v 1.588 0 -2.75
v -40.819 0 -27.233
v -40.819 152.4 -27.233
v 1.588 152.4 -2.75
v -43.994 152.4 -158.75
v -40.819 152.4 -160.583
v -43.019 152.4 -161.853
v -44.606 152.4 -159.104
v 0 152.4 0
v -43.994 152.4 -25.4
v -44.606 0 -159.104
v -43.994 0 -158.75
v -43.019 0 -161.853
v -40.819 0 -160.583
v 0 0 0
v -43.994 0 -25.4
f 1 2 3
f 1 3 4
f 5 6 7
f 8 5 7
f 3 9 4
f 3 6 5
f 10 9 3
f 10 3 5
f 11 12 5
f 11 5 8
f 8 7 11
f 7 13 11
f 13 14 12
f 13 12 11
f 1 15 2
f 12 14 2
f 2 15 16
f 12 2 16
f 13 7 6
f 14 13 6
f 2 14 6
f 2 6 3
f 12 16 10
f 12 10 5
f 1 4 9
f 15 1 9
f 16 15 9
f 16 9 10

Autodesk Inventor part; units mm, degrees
ref_plane "YZ Plane" through (0, 0, 0) normal (1, 0, 0) x (0, 1, 0)
ref_plane "XZ Plane" through (0, 0, 0) normal (0, 1, 0) x (-1, 0, 0)
ref_plane "XY Plane" through (0, 0, 0) normal (0, 0, 1) x (1, 0, 0)
sketch "Sketch6" plane through (0, 0, 0) normal (0, 1, 0) x (-1, 0, 0)
  line L0 (0, 0) -> (43.9941, -25.4)
  line L1 (43.9941, -25.4) -> (43.9941, -158.75)
  line L2 (43.9941, -158.75) -> (44.6063, -159.1035)
  line L3 (43.9941, -158.75) -> (44.701, -158.75) construction
  line L4 (43.0188, -161.8531) -> (40.8191, -160.5831)
  line L5 (40.8191, -160.5831) -> (40.8191, -27.2331)
  line L6 (40.8191, -27.2331) -> (-1.5875, -2.7496)
  line L7 (-1.5875, -2.7496) -> (0, 0)
  line L8 (0, 0) -> (22.7499, 0) construction
  line L9 (43.0188, -161.8531) -> (44.6063, -159.1035)
  dimension "d15" = 50.8
  dimension "d17" = 133.35
  dimension "d21" = 3.175
  dimension "d22" = 30
  dimension "d27" = 120
  dimension "d29" = 2.54
  dimension "d30" = 90
extrude "Extrusion5" add sketch "Sketch6" along normal blind 152.4
properties part number "flap"
